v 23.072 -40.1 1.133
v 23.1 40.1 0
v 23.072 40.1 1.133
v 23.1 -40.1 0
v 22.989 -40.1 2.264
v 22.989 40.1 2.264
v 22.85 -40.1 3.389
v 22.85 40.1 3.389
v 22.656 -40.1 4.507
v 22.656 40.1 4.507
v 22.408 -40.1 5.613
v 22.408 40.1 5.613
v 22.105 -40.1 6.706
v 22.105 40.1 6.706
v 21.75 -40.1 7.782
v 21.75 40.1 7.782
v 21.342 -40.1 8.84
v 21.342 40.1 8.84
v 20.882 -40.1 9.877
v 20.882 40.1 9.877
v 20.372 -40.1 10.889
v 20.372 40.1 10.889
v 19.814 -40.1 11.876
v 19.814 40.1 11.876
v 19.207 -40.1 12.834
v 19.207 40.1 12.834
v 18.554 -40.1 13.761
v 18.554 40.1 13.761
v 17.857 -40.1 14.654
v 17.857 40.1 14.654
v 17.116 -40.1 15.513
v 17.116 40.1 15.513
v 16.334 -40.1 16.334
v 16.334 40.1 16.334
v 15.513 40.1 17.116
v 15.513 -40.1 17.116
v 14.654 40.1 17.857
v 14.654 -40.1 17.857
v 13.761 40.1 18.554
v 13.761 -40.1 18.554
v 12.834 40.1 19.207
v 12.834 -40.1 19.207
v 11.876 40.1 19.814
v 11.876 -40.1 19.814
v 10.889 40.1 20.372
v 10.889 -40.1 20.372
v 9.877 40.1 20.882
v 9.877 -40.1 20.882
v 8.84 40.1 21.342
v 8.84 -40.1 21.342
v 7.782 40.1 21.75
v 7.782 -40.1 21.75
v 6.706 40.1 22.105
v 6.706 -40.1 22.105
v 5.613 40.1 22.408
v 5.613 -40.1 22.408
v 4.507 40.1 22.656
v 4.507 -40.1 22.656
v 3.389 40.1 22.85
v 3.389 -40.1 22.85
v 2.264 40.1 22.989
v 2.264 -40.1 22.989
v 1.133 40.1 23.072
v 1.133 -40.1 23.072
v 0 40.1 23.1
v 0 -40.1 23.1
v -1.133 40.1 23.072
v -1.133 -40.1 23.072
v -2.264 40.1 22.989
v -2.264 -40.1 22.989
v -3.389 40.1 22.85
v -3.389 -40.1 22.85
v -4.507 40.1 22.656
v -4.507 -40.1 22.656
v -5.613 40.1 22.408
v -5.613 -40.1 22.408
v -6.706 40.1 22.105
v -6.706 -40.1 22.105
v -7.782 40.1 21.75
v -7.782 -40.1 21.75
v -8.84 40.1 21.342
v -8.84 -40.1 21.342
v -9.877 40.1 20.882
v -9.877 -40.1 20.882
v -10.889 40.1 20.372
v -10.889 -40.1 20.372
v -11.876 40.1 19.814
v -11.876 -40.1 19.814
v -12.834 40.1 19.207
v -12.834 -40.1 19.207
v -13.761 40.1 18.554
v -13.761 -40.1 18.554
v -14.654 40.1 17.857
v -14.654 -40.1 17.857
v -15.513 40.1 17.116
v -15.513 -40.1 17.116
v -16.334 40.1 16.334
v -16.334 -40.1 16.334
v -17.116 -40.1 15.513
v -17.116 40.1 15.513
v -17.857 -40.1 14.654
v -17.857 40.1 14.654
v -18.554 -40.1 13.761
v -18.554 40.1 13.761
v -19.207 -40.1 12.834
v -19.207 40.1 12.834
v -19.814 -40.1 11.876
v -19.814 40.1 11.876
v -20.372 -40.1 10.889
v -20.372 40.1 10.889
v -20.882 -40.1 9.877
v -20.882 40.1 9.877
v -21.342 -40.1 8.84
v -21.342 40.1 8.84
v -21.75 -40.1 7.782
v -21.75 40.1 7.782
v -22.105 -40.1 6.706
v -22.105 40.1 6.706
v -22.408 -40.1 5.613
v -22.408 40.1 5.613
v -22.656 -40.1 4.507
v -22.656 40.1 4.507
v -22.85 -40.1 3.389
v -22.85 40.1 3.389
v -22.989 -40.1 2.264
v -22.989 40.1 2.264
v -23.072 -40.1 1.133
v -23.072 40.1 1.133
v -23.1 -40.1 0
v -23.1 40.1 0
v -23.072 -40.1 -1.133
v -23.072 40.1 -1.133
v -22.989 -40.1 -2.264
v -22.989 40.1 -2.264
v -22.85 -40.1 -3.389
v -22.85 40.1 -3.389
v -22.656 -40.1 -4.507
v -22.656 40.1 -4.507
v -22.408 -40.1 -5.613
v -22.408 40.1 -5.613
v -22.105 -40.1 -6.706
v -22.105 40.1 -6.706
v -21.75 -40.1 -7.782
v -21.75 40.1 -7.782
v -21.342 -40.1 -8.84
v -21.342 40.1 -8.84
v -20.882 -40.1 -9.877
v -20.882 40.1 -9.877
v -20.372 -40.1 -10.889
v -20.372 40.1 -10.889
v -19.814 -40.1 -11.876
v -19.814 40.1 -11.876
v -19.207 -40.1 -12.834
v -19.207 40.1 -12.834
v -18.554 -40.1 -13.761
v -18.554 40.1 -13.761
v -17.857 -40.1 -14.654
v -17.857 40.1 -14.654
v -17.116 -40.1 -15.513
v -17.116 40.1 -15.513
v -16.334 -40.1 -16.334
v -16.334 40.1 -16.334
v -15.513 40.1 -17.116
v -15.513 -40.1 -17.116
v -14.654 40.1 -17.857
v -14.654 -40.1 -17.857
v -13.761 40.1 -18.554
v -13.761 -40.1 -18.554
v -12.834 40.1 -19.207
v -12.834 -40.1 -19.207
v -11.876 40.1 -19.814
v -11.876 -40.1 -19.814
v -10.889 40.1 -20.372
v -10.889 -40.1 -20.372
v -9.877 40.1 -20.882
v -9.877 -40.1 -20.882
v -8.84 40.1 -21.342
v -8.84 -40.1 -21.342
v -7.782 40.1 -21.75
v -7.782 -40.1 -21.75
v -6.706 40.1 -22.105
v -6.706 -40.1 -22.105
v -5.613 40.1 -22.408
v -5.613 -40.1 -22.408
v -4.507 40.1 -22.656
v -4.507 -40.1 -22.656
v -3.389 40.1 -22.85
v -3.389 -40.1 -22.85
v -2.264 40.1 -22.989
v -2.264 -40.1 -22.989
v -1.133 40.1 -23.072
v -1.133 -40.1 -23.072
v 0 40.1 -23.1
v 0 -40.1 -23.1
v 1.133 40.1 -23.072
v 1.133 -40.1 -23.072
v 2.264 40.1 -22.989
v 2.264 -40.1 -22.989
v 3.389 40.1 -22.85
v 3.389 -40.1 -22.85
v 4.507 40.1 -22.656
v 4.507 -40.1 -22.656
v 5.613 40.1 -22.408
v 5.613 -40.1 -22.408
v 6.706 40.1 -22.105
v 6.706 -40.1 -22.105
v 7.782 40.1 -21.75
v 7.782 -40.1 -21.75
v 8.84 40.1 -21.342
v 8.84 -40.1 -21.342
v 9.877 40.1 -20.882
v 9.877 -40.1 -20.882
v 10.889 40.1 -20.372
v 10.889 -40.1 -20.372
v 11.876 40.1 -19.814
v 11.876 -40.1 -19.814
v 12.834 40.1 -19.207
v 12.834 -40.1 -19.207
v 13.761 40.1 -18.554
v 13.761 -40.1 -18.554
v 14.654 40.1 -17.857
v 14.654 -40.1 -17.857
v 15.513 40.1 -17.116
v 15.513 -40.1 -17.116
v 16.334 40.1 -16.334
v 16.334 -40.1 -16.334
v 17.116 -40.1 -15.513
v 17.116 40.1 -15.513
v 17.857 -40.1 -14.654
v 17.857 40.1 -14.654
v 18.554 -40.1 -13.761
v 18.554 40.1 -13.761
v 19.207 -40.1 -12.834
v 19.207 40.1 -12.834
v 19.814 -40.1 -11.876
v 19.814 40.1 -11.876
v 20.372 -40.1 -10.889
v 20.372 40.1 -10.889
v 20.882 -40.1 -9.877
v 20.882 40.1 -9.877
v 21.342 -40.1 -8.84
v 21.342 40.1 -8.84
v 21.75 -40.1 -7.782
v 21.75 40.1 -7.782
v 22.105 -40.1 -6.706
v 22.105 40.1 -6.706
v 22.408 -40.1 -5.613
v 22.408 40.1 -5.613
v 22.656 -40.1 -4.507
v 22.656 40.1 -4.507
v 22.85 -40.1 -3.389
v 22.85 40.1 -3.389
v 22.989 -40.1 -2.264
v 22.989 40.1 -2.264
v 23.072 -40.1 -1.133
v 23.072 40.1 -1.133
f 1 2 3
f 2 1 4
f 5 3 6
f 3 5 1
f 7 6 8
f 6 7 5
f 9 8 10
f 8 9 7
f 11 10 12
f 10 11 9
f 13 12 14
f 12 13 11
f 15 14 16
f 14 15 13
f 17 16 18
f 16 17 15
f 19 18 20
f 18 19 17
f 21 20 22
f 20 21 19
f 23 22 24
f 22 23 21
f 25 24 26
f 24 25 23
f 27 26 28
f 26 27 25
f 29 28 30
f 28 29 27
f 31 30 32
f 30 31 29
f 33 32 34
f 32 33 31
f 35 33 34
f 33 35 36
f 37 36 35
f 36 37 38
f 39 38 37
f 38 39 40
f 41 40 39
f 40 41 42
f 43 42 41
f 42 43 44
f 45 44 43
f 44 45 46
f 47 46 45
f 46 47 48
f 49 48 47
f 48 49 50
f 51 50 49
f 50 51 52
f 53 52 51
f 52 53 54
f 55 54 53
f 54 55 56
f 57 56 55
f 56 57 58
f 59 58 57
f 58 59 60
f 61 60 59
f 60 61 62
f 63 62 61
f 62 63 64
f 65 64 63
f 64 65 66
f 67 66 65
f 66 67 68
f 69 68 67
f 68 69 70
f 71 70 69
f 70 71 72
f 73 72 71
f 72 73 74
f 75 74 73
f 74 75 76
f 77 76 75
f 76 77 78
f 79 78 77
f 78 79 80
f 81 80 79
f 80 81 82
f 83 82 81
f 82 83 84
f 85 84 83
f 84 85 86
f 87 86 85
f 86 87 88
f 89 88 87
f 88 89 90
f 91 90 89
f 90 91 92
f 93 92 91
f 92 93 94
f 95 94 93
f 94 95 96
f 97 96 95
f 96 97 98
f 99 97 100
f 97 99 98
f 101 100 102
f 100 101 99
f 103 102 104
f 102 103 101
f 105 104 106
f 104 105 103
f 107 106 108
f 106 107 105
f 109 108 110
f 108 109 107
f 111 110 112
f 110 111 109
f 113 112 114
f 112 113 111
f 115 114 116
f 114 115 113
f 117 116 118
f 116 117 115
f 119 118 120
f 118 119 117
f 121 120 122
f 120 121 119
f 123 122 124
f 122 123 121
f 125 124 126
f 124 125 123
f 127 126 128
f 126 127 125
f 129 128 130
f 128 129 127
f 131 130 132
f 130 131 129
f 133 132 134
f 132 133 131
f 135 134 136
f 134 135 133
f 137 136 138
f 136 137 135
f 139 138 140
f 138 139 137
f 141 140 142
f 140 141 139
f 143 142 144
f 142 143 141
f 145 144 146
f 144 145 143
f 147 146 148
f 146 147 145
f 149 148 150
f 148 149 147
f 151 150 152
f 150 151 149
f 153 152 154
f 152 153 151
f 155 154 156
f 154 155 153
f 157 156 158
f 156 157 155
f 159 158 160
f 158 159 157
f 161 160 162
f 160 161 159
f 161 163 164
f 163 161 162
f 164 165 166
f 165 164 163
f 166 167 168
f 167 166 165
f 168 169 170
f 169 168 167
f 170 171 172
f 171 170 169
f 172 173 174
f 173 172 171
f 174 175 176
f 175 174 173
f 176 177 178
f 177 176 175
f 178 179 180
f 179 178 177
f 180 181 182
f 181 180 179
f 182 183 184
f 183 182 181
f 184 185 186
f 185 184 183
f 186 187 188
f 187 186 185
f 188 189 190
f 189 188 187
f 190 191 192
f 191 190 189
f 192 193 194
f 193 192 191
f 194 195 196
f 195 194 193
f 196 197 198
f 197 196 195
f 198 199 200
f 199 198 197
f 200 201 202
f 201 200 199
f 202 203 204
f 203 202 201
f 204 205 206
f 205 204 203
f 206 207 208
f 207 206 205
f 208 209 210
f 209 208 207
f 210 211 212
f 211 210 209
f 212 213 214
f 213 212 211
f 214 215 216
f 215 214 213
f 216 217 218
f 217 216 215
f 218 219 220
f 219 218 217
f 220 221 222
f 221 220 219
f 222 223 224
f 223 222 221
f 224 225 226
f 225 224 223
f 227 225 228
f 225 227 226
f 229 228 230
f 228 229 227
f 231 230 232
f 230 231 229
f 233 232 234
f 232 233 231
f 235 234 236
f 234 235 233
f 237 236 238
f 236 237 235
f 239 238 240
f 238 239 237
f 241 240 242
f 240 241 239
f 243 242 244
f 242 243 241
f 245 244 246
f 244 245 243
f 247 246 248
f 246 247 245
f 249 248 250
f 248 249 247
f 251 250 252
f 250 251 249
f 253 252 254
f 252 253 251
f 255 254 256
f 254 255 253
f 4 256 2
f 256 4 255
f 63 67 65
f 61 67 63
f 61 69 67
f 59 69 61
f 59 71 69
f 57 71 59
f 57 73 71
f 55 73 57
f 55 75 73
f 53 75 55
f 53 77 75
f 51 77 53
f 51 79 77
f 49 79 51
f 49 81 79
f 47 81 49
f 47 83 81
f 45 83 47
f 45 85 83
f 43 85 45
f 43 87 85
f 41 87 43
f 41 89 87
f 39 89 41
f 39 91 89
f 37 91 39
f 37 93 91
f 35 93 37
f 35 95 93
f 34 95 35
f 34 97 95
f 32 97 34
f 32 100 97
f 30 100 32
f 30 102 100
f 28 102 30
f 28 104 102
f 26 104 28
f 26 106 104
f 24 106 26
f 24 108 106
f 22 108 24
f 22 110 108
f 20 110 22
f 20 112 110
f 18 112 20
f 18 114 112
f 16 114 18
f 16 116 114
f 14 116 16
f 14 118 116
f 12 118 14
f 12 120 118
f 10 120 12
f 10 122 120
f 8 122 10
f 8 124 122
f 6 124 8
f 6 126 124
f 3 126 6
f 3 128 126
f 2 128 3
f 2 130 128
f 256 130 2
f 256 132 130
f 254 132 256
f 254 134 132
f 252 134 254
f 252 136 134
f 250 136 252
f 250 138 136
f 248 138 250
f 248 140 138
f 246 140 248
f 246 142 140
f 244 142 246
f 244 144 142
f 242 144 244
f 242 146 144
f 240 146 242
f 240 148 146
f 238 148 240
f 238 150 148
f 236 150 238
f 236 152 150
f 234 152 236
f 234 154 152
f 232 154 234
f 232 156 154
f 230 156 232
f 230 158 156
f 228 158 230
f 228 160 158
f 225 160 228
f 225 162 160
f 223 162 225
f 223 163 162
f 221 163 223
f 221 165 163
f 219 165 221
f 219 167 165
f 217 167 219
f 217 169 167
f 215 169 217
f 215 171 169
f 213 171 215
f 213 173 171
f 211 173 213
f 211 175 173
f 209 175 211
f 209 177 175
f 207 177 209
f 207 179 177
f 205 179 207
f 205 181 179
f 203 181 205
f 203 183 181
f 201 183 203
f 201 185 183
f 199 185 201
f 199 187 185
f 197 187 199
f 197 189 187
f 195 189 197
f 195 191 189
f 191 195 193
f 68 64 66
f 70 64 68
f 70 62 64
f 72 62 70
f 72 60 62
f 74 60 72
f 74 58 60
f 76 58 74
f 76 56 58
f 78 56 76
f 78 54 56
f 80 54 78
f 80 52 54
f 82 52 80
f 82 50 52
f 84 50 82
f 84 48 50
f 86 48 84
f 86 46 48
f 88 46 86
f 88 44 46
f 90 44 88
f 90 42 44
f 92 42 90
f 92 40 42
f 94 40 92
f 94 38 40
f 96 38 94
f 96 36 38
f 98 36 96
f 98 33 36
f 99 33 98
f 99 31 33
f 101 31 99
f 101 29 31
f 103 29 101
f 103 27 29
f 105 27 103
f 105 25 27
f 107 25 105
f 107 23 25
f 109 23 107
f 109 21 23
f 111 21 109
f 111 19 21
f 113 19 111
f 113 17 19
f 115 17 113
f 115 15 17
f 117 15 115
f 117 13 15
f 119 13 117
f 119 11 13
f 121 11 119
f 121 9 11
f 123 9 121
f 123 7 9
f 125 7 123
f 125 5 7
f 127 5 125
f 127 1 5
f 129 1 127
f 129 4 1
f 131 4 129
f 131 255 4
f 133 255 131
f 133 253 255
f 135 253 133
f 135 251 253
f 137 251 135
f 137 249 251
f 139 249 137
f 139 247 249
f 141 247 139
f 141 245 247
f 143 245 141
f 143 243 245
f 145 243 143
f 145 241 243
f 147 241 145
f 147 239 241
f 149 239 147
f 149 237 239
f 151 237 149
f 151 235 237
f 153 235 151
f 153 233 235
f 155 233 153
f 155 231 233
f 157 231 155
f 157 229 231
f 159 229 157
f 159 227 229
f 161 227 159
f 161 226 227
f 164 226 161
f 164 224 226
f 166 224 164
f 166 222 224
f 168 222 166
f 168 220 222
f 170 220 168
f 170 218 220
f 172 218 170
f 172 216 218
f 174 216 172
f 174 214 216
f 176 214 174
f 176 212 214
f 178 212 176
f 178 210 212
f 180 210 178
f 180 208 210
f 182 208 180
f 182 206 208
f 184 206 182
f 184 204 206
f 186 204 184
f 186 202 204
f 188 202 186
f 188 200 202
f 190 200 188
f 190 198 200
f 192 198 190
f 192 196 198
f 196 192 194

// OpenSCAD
$fn = 128;

height   = 80.2;
diameter = 46.2;

rotate([90, 0, 0])  // orient cylinder axis along Y so front/back/left/right show height
    cylinder(h = height, d = diameter, center = true);
